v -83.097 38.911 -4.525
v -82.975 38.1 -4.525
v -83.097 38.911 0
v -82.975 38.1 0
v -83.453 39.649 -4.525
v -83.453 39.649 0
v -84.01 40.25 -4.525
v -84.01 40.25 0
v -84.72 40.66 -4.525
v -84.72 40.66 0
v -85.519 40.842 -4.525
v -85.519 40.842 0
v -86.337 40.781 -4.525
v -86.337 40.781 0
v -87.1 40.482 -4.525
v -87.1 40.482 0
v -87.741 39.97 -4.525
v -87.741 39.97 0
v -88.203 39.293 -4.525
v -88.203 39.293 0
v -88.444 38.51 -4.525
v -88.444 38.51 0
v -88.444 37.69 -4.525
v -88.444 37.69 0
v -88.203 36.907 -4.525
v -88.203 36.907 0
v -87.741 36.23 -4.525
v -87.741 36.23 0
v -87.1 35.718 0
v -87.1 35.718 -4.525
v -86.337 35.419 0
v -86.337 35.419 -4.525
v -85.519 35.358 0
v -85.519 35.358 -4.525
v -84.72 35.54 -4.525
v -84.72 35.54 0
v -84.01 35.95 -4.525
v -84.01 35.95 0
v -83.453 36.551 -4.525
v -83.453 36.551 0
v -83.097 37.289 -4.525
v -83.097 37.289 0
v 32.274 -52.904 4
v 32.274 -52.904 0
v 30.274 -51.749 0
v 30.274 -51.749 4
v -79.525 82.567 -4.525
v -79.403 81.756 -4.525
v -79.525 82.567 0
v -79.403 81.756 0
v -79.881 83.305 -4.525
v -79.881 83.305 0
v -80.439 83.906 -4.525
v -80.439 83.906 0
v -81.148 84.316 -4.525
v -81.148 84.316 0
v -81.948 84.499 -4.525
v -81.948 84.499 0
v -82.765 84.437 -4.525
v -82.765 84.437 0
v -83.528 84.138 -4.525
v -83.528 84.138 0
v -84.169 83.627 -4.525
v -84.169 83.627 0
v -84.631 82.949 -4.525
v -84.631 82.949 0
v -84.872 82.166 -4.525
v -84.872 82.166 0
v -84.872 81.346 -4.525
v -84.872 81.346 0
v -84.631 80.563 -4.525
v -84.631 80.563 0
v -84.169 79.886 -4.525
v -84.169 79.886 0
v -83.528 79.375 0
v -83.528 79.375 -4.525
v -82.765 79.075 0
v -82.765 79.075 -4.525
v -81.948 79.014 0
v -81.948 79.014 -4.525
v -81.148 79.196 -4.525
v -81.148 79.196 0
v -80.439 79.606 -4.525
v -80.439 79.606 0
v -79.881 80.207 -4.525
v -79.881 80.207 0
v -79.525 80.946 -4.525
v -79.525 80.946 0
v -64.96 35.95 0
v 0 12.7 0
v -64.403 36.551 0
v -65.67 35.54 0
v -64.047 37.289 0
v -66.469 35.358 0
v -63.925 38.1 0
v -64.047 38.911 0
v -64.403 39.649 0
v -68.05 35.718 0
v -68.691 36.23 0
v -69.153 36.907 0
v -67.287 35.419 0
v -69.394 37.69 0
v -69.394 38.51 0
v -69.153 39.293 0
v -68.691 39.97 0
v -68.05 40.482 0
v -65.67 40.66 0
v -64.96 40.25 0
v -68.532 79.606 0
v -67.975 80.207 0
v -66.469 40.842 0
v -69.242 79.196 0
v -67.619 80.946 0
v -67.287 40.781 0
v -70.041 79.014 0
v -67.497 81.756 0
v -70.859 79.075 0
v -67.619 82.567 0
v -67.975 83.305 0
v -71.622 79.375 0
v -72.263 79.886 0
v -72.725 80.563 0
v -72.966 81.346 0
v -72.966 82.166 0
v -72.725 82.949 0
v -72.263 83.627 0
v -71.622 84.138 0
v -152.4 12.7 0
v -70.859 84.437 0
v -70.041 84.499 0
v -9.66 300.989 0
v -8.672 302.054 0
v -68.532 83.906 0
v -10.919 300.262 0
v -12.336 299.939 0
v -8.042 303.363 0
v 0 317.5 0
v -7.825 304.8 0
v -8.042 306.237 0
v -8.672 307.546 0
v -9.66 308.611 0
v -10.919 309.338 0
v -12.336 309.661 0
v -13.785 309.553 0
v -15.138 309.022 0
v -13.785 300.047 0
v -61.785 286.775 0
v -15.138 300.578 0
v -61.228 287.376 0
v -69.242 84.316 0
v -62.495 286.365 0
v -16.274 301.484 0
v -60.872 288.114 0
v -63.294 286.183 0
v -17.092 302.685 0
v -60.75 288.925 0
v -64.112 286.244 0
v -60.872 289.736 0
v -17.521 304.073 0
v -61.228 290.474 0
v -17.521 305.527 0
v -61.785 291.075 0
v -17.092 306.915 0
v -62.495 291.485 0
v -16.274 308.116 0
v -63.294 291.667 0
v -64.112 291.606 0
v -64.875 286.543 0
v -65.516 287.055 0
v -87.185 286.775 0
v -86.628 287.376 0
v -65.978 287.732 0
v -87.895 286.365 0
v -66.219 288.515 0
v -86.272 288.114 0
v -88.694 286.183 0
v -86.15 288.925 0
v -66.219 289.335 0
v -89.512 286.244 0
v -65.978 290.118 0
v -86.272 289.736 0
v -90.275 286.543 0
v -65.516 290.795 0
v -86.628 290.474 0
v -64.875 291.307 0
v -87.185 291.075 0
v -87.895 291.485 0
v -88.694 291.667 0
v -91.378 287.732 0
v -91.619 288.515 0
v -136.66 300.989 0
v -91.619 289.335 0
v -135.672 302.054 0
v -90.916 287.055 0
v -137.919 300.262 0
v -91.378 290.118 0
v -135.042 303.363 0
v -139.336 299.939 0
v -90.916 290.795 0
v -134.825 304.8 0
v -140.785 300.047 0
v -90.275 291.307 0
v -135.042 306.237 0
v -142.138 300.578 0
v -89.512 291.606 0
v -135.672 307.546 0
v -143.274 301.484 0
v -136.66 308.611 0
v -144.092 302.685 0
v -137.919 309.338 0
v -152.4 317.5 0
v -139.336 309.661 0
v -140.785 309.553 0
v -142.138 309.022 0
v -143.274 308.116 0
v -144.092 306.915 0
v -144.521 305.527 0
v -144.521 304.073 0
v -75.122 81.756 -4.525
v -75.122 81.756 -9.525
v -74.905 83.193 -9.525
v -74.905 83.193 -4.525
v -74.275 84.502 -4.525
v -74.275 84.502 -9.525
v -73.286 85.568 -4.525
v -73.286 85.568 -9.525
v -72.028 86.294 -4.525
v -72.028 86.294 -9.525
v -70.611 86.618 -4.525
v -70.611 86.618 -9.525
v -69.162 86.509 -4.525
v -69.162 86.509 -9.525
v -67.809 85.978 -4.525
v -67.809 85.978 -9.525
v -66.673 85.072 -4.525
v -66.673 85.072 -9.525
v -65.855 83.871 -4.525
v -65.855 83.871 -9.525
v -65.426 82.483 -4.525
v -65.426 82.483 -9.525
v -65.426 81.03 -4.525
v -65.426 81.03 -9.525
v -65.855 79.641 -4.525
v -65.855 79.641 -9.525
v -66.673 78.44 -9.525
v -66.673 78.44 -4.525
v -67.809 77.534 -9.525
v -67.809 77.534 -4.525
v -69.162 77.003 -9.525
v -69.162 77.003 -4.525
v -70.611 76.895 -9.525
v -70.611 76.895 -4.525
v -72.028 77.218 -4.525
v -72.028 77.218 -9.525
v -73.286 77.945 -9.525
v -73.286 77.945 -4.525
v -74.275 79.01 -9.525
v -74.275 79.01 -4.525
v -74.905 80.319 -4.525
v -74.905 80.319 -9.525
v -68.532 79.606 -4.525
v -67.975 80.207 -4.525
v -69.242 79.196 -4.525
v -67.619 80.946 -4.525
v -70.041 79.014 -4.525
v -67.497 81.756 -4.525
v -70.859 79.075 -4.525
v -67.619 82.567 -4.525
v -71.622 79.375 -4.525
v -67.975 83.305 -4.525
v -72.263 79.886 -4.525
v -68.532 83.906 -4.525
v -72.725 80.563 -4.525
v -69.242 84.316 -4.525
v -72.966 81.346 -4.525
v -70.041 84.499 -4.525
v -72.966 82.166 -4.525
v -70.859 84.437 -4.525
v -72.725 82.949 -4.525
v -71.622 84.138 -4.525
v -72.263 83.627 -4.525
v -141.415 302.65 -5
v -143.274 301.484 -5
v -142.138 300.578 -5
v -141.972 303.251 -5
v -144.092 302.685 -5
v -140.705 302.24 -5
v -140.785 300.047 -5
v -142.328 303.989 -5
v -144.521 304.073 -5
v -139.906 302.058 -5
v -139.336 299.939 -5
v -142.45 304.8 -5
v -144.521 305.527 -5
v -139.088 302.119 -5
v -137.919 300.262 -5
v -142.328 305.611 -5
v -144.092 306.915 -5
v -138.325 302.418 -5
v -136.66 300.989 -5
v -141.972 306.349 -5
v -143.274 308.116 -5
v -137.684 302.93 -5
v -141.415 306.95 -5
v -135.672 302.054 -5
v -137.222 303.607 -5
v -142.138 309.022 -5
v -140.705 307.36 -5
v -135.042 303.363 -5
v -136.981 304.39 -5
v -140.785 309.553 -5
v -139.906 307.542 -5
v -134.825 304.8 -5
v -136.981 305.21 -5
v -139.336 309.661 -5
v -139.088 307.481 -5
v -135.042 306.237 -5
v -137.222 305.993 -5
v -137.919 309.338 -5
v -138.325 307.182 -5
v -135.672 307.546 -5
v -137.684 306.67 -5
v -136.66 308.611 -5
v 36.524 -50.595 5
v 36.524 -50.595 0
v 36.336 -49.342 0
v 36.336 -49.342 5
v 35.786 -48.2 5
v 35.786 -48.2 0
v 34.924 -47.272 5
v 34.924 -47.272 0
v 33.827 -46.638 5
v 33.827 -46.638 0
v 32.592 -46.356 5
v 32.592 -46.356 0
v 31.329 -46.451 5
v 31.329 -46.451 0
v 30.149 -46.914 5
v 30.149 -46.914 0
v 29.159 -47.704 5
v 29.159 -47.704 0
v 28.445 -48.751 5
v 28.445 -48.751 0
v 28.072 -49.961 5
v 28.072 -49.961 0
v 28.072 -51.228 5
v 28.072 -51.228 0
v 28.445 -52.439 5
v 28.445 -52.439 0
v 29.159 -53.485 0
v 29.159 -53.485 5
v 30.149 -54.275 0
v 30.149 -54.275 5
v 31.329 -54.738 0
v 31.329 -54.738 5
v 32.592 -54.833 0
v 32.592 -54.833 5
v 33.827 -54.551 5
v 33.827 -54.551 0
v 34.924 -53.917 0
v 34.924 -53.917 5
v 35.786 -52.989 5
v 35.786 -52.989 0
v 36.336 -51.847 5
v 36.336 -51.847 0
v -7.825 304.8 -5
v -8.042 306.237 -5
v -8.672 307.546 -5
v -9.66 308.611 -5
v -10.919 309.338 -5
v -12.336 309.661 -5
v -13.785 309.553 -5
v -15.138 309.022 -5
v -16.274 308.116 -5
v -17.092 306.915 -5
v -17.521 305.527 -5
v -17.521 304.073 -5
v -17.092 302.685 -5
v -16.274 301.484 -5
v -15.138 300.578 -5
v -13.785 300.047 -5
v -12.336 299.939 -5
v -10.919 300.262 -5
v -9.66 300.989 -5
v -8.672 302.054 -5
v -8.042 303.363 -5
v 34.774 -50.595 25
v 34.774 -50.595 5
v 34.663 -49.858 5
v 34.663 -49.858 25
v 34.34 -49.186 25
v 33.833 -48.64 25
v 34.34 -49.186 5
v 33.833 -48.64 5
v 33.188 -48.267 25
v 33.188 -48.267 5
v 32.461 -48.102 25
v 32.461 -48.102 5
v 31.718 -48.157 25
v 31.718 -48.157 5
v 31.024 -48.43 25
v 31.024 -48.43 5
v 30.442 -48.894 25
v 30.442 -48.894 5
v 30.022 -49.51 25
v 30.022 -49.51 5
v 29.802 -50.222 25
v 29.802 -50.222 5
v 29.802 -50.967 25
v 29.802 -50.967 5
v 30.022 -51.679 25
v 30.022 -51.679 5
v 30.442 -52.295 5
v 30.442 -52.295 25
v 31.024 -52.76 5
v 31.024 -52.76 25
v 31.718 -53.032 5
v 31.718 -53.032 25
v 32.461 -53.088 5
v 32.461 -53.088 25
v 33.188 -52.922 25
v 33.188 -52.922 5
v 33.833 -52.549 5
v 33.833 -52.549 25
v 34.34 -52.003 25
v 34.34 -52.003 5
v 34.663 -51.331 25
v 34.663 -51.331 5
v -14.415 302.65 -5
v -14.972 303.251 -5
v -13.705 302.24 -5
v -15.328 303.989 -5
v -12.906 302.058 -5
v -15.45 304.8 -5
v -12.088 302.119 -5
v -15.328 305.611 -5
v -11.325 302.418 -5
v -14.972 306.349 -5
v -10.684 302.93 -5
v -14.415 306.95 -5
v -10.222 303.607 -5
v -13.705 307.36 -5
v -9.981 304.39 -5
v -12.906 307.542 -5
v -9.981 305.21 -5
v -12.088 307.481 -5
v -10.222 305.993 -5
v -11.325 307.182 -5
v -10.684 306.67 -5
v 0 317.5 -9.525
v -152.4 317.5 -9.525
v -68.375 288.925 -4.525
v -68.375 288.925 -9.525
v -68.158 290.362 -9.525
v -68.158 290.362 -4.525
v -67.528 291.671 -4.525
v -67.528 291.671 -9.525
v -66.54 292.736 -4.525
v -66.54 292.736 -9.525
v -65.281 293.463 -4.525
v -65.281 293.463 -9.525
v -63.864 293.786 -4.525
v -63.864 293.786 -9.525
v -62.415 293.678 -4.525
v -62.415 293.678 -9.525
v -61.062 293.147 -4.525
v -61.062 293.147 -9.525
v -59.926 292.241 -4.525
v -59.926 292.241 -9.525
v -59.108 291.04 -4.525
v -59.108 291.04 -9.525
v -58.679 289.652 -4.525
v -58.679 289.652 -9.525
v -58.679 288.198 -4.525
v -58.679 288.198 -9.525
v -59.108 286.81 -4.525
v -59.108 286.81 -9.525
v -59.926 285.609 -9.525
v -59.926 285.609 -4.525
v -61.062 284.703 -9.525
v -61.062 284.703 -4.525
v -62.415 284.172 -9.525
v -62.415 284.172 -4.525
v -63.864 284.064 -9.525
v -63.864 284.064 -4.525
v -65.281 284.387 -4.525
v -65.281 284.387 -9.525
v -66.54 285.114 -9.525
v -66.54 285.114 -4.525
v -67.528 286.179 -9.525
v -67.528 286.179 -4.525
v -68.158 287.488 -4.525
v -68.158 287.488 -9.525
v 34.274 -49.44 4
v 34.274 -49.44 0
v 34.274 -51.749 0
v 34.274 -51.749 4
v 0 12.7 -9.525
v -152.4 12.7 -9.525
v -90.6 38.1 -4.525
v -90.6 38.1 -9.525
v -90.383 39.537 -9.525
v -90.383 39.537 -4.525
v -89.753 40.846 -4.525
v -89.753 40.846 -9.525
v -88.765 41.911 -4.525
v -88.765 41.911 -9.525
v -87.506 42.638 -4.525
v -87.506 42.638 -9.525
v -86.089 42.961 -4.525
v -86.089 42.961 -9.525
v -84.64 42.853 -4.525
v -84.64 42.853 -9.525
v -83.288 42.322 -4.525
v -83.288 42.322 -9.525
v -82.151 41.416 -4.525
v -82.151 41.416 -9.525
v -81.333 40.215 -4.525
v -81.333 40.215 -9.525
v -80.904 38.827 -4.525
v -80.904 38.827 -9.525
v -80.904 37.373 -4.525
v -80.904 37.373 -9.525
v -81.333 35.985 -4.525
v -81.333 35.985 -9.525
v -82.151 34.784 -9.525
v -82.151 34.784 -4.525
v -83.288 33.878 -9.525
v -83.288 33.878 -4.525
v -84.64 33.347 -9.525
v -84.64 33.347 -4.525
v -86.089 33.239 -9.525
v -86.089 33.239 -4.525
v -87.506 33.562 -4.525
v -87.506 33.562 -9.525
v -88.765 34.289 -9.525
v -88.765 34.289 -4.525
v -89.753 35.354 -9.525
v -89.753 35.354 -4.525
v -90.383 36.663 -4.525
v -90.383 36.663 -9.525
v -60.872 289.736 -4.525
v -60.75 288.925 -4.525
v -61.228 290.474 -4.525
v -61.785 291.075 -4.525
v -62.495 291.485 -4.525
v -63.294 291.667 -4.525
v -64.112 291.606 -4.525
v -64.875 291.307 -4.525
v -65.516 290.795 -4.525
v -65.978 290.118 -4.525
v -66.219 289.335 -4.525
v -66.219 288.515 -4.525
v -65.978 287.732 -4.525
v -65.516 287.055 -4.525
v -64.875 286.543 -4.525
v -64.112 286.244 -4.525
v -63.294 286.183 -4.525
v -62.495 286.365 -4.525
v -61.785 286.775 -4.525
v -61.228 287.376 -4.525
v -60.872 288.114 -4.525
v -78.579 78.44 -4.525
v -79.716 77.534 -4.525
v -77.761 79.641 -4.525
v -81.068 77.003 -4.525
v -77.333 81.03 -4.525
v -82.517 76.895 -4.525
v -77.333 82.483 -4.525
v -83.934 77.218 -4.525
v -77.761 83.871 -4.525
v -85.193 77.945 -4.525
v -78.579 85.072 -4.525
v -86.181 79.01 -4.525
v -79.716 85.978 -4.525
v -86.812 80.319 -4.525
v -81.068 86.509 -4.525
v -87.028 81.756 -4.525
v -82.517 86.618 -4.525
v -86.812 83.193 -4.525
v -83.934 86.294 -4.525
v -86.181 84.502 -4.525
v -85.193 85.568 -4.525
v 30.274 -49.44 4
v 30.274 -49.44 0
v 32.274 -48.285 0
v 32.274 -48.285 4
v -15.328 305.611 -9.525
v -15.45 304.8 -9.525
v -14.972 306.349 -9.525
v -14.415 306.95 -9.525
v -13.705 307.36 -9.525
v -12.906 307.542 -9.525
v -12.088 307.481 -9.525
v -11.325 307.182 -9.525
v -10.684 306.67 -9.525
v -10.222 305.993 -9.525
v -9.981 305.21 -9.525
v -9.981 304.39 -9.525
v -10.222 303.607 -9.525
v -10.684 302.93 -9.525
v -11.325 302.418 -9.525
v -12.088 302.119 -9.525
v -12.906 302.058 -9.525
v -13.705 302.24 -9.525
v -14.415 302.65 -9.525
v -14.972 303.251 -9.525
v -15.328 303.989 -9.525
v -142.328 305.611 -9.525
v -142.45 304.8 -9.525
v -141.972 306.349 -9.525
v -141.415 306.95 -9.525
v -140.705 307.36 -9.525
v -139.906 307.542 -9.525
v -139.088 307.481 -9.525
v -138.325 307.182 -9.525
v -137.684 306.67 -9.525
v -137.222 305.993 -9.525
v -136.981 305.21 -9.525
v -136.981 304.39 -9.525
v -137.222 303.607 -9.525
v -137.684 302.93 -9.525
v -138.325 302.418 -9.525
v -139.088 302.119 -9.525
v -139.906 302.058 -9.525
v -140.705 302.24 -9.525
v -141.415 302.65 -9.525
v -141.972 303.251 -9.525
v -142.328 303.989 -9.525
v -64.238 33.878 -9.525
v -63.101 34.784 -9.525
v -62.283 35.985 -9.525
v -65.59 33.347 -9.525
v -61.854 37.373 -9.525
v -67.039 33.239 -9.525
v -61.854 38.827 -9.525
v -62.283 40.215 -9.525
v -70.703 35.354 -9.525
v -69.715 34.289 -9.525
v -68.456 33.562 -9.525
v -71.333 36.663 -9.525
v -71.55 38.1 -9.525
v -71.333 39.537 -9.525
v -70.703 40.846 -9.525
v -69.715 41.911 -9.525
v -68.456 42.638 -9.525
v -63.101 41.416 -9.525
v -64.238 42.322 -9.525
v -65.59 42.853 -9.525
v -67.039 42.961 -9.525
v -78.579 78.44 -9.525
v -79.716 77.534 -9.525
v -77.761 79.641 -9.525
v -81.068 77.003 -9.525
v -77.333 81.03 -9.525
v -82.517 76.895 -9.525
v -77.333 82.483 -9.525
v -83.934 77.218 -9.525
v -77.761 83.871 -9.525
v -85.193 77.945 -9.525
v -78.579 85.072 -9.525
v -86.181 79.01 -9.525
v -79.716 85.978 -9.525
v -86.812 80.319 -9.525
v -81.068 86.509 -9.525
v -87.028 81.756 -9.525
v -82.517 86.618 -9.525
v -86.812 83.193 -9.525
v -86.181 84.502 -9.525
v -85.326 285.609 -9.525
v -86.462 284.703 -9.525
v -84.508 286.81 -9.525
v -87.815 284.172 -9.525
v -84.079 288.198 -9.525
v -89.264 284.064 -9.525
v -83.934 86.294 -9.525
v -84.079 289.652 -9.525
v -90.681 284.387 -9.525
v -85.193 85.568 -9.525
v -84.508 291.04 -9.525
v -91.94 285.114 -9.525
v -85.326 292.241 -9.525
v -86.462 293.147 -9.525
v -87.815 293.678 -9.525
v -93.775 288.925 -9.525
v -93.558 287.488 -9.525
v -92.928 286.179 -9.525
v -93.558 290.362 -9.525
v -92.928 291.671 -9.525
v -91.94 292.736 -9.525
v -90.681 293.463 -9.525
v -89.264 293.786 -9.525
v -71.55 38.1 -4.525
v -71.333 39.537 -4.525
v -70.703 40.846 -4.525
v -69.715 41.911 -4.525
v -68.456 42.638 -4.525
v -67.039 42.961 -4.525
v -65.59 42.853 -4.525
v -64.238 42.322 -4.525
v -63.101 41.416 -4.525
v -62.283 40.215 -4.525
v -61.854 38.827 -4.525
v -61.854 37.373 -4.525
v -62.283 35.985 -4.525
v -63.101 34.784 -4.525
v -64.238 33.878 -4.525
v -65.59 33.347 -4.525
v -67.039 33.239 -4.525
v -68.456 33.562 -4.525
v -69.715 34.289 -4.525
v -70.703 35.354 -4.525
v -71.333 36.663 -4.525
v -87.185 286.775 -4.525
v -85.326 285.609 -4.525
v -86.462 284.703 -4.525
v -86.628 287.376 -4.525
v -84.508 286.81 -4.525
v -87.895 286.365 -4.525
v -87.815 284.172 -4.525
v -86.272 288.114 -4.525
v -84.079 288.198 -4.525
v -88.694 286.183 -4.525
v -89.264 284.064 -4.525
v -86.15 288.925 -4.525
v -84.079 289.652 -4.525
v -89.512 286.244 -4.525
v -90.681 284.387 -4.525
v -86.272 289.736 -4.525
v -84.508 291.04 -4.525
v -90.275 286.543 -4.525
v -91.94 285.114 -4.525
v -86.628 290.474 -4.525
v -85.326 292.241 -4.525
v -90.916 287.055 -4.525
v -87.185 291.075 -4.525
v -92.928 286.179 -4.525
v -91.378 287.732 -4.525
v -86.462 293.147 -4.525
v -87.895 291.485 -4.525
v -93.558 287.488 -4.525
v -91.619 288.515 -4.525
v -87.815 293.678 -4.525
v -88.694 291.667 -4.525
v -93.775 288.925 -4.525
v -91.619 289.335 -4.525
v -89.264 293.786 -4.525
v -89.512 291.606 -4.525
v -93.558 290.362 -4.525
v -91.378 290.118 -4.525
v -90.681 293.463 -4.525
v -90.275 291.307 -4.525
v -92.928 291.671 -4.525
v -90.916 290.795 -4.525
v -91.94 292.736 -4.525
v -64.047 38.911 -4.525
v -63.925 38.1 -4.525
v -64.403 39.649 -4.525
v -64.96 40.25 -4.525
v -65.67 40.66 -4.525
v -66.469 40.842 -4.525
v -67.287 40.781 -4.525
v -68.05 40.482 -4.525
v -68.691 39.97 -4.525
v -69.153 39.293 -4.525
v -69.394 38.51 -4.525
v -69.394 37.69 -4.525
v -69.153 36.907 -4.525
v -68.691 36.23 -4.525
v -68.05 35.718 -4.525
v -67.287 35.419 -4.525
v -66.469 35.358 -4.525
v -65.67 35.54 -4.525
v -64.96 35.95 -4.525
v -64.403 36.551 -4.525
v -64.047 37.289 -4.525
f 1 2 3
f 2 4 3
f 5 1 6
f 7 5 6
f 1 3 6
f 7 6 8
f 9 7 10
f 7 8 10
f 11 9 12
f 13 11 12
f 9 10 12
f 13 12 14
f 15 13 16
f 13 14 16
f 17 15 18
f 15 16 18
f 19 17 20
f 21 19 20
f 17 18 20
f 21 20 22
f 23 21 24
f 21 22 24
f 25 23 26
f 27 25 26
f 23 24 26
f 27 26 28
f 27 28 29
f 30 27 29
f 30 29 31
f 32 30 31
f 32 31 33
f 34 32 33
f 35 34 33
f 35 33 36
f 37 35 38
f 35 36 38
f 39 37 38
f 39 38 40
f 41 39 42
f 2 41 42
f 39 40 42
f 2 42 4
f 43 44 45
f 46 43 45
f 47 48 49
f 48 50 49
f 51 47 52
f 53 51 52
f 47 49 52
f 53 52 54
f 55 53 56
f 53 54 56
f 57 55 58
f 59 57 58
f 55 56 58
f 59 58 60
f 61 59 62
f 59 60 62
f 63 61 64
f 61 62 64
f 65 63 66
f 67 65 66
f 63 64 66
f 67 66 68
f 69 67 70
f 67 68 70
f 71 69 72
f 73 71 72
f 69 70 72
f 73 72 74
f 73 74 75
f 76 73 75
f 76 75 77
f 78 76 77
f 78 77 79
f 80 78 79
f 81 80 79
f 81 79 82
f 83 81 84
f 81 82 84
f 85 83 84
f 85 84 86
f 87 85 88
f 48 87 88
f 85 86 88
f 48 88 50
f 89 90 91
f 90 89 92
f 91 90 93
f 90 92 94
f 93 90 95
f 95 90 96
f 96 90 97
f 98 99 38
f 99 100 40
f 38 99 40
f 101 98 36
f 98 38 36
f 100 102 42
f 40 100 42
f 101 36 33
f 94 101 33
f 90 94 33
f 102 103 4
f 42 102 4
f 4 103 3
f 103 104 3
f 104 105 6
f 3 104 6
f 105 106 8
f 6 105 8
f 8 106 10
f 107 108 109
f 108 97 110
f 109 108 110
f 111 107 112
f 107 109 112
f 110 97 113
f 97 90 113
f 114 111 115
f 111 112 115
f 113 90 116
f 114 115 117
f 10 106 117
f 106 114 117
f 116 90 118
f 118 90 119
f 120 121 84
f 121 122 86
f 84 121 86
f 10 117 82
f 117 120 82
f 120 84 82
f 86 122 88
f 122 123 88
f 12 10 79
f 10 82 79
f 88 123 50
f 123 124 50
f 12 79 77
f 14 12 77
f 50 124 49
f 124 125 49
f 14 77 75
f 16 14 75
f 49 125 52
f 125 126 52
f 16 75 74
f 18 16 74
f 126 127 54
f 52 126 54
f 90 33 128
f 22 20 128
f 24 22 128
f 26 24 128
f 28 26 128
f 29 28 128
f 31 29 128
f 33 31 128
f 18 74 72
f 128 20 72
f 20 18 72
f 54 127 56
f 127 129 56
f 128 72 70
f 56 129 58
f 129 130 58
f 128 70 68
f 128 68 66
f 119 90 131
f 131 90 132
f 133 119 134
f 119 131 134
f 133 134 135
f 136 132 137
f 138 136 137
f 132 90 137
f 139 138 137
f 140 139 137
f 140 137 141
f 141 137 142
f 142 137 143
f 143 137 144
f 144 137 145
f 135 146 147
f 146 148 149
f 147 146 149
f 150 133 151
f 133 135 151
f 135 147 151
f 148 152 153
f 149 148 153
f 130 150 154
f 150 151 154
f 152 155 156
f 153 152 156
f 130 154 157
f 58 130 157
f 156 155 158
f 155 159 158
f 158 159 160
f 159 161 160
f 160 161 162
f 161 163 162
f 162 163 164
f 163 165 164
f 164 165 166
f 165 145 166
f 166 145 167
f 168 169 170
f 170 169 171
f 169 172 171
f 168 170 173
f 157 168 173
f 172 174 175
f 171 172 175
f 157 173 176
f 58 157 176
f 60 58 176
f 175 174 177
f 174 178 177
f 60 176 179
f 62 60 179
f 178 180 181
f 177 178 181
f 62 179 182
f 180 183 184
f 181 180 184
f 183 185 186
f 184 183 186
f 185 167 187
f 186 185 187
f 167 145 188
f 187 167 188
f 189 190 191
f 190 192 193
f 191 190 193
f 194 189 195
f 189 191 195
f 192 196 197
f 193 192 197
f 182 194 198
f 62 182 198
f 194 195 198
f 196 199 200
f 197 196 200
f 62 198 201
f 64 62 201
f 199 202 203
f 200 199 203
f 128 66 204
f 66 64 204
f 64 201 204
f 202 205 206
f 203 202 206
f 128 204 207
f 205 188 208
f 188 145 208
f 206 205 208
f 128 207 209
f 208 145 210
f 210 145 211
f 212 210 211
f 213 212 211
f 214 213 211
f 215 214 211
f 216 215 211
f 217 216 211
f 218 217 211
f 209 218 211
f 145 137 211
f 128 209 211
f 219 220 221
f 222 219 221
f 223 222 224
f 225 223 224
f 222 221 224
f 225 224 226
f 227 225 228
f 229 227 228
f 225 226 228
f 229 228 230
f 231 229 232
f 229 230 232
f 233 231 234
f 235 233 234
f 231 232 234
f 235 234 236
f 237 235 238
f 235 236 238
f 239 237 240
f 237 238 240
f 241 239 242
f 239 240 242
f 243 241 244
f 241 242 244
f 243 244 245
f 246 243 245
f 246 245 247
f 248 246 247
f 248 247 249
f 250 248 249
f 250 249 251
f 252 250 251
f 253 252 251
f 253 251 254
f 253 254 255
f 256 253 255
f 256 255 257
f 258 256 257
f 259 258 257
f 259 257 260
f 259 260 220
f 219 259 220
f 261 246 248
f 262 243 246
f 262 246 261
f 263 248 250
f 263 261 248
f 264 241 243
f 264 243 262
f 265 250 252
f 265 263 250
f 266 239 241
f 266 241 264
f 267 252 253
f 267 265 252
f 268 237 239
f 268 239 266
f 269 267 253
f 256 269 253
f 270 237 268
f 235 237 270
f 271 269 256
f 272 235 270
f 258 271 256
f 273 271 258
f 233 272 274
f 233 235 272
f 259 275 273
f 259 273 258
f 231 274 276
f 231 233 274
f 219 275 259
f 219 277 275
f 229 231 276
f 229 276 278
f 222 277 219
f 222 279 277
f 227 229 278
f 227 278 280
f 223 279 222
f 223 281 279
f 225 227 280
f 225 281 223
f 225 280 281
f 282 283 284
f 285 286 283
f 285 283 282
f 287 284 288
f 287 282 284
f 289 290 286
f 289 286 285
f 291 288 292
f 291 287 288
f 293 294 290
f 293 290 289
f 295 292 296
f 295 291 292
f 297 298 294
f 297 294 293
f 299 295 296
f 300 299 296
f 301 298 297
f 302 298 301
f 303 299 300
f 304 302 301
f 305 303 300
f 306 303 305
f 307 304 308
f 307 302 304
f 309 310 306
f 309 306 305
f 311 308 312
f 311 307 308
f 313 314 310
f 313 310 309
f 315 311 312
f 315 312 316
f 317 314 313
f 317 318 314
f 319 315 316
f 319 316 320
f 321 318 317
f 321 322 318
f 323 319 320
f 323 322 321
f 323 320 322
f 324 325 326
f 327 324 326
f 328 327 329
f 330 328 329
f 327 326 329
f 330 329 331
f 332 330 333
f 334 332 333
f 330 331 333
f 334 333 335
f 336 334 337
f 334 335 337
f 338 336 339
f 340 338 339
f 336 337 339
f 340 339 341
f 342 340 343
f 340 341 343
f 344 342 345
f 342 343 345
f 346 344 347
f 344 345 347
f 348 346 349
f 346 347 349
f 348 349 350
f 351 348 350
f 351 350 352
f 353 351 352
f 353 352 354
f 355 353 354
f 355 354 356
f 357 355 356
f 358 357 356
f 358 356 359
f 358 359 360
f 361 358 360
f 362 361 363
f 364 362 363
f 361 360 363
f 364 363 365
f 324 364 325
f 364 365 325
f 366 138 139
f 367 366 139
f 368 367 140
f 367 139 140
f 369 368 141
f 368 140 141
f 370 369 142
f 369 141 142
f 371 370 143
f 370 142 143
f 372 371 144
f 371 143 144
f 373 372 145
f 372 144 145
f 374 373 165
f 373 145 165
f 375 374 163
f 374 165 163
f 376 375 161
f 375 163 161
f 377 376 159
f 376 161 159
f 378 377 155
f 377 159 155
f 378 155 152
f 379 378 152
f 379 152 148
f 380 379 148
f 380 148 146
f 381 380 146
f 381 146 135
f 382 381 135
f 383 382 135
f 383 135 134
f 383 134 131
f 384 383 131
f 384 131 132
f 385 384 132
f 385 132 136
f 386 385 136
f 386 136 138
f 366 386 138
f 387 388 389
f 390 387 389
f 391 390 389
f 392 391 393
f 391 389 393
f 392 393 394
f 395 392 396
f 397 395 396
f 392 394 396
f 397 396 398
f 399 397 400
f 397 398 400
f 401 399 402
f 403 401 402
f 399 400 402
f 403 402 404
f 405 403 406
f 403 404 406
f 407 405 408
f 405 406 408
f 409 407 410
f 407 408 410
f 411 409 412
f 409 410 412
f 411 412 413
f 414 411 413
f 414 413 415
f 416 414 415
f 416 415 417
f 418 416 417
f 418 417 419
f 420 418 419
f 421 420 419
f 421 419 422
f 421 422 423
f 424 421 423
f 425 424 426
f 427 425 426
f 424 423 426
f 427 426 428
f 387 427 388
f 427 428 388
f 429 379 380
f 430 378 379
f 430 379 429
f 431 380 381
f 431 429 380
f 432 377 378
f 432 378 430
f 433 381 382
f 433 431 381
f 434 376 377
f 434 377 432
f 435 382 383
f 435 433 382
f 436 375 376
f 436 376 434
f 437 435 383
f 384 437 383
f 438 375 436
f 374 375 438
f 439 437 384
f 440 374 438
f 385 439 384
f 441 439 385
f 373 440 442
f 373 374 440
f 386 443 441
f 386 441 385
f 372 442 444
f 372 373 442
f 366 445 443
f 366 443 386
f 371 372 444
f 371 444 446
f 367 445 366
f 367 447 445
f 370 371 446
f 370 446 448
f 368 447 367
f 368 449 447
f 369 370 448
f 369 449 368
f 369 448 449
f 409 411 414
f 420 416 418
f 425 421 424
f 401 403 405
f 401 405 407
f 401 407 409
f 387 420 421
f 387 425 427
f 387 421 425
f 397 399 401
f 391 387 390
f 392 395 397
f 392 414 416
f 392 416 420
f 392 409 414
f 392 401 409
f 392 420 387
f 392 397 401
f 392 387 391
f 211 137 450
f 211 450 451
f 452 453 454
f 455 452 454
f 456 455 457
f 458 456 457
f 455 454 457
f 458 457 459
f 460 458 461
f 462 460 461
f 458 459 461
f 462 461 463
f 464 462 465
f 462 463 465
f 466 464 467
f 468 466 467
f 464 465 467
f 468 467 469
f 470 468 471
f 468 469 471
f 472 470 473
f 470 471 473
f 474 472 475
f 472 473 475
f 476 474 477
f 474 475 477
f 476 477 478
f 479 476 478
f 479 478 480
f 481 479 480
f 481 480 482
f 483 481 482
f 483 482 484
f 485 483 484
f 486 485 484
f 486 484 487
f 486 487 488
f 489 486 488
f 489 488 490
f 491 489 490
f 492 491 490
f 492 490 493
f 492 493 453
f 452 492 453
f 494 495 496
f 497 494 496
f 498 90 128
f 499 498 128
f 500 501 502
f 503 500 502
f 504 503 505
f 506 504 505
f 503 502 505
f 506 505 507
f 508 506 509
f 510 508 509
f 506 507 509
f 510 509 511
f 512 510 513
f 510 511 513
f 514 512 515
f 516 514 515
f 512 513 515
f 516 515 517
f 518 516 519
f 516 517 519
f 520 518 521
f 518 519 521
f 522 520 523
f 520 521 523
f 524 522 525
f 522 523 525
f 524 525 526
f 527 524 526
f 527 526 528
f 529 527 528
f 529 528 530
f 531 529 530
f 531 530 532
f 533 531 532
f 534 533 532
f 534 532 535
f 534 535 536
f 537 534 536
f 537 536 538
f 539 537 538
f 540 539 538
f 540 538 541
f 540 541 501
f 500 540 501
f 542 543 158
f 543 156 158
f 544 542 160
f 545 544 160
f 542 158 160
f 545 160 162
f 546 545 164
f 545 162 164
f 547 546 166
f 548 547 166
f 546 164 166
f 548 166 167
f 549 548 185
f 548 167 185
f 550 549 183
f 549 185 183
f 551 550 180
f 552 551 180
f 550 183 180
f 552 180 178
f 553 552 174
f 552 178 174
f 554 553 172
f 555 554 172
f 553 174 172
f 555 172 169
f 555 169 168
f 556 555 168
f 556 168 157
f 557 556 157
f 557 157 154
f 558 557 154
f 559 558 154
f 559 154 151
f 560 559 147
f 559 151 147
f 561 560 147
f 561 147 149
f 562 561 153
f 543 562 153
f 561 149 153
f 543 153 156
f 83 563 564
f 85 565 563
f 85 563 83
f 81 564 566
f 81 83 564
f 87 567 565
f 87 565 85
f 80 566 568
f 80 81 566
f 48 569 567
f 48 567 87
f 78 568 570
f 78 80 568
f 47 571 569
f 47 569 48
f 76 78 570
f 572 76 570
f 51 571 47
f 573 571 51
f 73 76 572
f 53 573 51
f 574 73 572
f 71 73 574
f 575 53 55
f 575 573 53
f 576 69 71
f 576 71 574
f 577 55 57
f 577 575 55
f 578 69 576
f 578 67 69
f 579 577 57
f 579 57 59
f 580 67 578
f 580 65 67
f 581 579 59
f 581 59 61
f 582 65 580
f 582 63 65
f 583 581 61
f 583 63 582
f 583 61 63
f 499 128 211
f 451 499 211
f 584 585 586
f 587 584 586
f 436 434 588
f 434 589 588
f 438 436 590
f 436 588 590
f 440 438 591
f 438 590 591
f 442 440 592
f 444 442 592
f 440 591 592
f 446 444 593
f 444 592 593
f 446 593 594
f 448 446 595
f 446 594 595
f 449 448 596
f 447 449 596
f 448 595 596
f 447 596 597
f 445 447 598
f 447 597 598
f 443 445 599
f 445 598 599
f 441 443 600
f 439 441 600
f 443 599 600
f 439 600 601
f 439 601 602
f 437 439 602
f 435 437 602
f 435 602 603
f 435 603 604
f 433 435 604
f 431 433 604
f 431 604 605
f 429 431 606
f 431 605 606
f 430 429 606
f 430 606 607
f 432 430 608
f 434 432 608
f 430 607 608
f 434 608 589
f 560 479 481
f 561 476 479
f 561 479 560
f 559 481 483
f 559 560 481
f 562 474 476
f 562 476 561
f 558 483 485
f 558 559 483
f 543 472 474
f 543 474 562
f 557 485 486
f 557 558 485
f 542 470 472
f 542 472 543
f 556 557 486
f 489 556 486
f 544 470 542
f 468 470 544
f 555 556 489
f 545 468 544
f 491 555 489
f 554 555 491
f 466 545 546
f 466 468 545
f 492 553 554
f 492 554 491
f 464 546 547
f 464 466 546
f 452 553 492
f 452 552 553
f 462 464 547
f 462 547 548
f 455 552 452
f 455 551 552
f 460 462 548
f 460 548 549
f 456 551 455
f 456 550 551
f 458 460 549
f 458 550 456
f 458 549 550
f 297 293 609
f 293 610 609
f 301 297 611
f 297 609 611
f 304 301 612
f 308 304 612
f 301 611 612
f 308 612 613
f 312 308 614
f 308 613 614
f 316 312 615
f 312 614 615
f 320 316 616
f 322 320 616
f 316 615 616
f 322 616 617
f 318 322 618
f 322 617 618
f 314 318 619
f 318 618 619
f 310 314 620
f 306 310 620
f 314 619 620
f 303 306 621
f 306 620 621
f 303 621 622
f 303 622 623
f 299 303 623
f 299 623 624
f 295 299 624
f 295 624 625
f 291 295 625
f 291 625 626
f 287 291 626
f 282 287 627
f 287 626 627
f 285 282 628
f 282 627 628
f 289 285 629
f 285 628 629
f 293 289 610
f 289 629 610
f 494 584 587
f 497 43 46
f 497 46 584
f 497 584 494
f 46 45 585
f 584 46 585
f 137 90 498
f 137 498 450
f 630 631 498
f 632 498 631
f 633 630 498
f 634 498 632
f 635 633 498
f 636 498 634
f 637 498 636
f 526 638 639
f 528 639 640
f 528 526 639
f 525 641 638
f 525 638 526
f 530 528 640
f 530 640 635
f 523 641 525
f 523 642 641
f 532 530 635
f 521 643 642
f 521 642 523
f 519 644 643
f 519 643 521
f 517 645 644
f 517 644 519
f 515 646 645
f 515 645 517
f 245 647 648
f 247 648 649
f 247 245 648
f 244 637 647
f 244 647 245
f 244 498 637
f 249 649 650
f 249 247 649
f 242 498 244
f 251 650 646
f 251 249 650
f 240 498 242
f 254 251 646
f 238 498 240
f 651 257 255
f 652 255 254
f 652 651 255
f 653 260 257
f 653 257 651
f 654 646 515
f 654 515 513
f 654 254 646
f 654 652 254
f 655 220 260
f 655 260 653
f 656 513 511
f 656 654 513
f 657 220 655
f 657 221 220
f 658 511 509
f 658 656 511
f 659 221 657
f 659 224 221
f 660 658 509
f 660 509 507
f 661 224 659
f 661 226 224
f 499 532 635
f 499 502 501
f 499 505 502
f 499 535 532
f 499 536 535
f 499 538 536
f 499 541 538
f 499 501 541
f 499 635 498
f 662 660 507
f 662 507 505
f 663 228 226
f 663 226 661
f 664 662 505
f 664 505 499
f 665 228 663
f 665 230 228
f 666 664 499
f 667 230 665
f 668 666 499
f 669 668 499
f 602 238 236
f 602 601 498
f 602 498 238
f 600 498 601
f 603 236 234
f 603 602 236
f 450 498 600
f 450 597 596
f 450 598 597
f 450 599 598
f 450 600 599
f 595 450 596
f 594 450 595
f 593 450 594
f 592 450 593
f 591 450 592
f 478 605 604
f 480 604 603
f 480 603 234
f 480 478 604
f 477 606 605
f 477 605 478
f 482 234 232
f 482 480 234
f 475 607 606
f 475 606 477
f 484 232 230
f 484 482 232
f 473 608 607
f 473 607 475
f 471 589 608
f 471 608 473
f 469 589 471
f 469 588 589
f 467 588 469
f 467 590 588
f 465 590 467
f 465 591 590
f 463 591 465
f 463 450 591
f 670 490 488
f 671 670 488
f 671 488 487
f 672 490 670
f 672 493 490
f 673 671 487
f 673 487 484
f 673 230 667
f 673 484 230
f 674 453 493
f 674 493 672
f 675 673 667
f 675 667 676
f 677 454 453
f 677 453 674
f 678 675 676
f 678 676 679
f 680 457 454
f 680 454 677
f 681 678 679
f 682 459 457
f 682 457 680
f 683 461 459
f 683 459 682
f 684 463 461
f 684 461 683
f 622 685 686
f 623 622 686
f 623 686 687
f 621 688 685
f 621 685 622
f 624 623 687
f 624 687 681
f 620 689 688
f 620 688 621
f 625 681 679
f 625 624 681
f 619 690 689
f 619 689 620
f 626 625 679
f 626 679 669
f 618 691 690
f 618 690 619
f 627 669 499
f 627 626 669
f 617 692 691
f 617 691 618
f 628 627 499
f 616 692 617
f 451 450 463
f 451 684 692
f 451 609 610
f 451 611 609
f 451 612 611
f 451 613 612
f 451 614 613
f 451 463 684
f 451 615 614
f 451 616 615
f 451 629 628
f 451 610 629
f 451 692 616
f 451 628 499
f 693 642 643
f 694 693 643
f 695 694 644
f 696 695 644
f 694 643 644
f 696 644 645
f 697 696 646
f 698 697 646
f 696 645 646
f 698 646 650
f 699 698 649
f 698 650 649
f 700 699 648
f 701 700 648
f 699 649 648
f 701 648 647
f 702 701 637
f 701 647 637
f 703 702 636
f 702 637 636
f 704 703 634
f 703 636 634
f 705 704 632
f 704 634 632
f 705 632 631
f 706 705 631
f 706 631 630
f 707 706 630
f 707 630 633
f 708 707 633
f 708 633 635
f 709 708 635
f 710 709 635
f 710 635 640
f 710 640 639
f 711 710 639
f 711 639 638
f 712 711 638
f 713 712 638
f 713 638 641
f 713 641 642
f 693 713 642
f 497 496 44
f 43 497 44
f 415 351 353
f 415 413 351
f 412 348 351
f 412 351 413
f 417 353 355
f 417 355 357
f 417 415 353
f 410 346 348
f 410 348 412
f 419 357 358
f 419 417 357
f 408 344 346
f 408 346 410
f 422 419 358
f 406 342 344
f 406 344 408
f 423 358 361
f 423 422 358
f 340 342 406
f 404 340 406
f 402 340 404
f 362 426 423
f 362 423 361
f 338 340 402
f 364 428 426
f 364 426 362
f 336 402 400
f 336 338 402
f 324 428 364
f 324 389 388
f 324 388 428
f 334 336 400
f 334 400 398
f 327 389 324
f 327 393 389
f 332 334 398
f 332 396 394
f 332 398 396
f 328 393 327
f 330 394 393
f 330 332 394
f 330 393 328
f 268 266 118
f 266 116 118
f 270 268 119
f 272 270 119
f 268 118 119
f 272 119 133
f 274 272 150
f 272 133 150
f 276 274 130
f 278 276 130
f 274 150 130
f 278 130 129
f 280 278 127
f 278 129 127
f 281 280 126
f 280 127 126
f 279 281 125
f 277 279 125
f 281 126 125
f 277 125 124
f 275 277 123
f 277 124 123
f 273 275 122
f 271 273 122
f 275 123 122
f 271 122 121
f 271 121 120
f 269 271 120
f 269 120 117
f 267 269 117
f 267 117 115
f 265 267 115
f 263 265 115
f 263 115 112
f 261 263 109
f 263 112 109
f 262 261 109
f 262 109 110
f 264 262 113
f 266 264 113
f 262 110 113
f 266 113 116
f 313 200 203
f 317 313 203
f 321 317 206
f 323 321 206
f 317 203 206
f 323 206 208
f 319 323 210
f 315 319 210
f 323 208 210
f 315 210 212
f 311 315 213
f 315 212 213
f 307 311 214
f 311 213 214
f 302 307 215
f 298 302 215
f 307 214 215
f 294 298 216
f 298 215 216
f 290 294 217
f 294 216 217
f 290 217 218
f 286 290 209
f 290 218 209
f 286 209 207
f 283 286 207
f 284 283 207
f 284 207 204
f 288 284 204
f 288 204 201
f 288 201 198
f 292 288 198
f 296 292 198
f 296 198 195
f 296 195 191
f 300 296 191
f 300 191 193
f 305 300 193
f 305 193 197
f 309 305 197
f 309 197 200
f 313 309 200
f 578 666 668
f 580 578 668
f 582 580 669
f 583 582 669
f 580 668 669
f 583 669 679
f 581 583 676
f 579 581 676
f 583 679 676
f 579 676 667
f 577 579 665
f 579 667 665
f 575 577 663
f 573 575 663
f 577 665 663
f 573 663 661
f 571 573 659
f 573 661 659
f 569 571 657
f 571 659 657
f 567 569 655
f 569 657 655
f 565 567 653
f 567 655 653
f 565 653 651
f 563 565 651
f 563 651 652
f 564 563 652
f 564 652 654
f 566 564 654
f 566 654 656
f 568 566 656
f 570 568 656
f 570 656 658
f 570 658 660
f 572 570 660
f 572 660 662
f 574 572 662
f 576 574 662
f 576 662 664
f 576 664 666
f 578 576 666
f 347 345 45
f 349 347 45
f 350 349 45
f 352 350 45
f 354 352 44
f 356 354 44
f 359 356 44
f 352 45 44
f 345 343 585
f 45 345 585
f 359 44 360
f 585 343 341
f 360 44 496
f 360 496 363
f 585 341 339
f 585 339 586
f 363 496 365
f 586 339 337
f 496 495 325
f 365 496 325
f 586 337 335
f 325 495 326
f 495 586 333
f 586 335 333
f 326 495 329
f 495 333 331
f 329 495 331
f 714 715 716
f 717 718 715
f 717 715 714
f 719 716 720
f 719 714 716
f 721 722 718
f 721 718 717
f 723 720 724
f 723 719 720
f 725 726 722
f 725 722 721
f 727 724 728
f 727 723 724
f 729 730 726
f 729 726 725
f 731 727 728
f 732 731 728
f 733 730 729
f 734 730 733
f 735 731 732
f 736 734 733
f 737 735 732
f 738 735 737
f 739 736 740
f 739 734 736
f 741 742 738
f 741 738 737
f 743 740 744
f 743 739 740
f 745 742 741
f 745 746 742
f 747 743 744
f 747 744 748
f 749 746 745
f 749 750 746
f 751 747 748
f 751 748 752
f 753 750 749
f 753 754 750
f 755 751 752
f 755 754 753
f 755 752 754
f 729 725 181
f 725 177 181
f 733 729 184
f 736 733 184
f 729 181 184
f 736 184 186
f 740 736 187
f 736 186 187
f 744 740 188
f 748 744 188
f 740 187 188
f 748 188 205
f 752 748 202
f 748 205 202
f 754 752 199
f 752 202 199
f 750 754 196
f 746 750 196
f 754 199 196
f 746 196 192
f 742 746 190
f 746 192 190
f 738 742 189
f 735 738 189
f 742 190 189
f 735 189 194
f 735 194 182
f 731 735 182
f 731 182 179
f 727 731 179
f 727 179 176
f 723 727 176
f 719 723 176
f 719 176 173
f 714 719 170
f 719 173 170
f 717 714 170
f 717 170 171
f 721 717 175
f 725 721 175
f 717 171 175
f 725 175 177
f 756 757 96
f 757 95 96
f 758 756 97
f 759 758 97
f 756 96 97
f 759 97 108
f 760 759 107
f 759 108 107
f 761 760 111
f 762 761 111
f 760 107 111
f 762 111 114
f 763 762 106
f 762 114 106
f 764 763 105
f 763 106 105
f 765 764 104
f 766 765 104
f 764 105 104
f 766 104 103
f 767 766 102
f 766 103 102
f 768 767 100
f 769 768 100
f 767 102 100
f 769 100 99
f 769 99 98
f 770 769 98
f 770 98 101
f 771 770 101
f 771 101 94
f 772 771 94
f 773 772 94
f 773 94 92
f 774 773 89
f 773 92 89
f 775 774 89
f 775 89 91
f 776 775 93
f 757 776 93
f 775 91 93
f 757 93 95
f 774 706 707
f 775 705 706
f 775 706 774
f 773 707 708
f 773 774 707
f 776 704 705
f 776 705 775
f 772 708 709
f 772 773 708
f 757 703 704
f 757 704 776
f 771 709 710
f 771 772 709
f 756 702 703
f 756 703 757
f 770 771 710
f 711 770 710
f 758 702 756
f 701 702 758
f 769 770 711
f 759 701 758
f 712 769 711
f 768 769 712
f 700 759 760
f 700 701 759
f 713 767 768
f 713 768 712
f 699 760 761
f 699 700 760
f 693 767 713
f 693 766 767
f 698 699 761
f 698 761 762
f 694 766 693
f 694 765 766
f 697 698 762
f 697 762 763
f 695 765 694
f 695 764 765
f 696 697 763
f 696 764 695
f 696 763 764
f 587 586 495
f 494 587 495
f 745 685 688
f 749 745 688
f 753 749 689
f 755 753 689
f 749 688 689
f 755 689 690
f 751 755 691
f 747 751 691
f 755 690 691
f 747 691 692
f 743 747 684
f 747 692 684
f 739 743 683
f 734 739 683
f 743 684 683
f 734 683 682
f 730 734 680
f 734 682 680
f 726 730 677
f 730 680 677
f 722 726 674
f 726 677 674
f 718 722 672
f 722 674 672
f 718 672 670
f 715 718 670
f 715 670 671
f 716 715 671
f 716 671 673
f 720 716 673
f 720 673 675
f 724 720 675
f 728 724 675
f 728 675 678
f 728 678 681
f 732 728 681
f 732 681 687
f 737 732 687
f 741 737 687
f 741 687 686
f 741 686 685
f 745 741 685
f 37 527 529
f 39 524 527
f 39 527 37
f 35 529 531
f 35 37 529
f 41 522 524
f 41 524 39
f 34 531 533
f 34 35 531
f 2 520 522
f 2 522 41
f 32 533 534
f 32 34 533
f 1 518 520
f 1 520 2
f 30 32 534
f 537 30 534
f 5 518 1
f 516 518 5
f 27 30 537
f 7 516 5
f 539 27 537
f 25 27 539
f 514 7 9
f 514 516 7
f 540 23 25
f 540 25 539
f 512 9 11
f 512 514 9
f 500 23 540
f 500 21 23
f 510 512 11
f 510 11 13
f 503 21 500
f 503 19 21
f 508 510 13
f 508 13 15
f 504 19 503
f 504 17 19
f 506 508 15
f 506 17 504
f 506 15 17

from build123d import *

# Parameters (mm, degrees)
F0_W            = 152.4
F0_H            = 317.5
F1_DEPTH        = 9.525
F3_D            = 5.5
F3_CBORE_D      = 9.75
F3_CBORE_DEPTH  = 5
F4_DEPTH        = 12.7
F5_ANGLE        = 180
F6_R            = 4.25
F7_DEPTH        = 5
F8_R            = 2.5
F9_DEPTH        = 20
F11_DEPTH       = 4
F13_D           = 5.5
F13_CBORE_D     = 9.75
F13_CBORE_DEPTH = 5


with BuildPart() as f1:
    # F0 (on Top) → F1 (new body)
    with BuildSketch(Plane.XY):
        with Locations((76.2, 158.75)):
            Rectangle(F0_W, F0_H)
    extrude(amount=F1_DEPTH)

    # F3 (through all)
    with Locations(Plane.XY.offset(9.525)):
        with Locations((70.246875, 81.75625), (82.153125, 81.75625), (66.675, 38.1), (85.725, 38.1), (88.9, 288.925), (63.5, 288.925)):
            CounterBoreHole(F3_D / 2, F3_CBORE_D / 2, F3_CBORE_DEPTH)

    # F4 (cut): a face of the model
    f4_faces = [f1.faces().sort_by_distance(p)[0] for p in [
        (76.2, 0, 4.7625),
    ]]
    extrude(f4_faces, amount=-F4_DEPTH, mode=Mode.SUBTRACT)


with BuildPart() as f1_1:
    # F5: moved
    add(f1.part.rotate(Axis((0, 165.1, 0), (0, 1, 0)), F5_ANGLE))

    # F13 (through all)
    with Locations(Plane.XY):
        with Locations((-139.7, 304.8), (-12.7, 304.8)):
            CounterBoreHole(F13_D / 2, F13_CBORE_D / 2, F13_CBORE_DEPTH)


with BuildPart() as f7:
    # F6 (on Top) → F7 (new body)
    with BuildSketch(Plane.XY):
        with Locations((32.274492085, -50.5946092308)):
            Circle(F6_R)
    extrude(amount=F7_DEPTH)

    # F8 (on face) → F9 (join)
    with BuildSketch(Plane.XY.offset(5)):
        with Locations((32.274492085, -50.5946092308)):
            Circle(F8_R)
    extrude(amount=F9_DEPTH)

    # F10 (on face) → F11 (cut)
    with BuildSketch(Plane(origin=(0, 0, 0), x_dir=(1, 0, 0), z_dir=(0, 0, -1))):
        Polygon((34.274492085, 49.4399086924), (34.274492085, 51.7493097691), (32.274492085, 52.9040103075), (30.274492085, 51.7493097691), (30.274492085, 49.4399086924), (32.274492085, 48.285208154), align=None)
    extrude(amount=-F11_DEPTH, mode=Mode.SUBTRACT)


solid = Compound([f1_1.part, f7.part])
